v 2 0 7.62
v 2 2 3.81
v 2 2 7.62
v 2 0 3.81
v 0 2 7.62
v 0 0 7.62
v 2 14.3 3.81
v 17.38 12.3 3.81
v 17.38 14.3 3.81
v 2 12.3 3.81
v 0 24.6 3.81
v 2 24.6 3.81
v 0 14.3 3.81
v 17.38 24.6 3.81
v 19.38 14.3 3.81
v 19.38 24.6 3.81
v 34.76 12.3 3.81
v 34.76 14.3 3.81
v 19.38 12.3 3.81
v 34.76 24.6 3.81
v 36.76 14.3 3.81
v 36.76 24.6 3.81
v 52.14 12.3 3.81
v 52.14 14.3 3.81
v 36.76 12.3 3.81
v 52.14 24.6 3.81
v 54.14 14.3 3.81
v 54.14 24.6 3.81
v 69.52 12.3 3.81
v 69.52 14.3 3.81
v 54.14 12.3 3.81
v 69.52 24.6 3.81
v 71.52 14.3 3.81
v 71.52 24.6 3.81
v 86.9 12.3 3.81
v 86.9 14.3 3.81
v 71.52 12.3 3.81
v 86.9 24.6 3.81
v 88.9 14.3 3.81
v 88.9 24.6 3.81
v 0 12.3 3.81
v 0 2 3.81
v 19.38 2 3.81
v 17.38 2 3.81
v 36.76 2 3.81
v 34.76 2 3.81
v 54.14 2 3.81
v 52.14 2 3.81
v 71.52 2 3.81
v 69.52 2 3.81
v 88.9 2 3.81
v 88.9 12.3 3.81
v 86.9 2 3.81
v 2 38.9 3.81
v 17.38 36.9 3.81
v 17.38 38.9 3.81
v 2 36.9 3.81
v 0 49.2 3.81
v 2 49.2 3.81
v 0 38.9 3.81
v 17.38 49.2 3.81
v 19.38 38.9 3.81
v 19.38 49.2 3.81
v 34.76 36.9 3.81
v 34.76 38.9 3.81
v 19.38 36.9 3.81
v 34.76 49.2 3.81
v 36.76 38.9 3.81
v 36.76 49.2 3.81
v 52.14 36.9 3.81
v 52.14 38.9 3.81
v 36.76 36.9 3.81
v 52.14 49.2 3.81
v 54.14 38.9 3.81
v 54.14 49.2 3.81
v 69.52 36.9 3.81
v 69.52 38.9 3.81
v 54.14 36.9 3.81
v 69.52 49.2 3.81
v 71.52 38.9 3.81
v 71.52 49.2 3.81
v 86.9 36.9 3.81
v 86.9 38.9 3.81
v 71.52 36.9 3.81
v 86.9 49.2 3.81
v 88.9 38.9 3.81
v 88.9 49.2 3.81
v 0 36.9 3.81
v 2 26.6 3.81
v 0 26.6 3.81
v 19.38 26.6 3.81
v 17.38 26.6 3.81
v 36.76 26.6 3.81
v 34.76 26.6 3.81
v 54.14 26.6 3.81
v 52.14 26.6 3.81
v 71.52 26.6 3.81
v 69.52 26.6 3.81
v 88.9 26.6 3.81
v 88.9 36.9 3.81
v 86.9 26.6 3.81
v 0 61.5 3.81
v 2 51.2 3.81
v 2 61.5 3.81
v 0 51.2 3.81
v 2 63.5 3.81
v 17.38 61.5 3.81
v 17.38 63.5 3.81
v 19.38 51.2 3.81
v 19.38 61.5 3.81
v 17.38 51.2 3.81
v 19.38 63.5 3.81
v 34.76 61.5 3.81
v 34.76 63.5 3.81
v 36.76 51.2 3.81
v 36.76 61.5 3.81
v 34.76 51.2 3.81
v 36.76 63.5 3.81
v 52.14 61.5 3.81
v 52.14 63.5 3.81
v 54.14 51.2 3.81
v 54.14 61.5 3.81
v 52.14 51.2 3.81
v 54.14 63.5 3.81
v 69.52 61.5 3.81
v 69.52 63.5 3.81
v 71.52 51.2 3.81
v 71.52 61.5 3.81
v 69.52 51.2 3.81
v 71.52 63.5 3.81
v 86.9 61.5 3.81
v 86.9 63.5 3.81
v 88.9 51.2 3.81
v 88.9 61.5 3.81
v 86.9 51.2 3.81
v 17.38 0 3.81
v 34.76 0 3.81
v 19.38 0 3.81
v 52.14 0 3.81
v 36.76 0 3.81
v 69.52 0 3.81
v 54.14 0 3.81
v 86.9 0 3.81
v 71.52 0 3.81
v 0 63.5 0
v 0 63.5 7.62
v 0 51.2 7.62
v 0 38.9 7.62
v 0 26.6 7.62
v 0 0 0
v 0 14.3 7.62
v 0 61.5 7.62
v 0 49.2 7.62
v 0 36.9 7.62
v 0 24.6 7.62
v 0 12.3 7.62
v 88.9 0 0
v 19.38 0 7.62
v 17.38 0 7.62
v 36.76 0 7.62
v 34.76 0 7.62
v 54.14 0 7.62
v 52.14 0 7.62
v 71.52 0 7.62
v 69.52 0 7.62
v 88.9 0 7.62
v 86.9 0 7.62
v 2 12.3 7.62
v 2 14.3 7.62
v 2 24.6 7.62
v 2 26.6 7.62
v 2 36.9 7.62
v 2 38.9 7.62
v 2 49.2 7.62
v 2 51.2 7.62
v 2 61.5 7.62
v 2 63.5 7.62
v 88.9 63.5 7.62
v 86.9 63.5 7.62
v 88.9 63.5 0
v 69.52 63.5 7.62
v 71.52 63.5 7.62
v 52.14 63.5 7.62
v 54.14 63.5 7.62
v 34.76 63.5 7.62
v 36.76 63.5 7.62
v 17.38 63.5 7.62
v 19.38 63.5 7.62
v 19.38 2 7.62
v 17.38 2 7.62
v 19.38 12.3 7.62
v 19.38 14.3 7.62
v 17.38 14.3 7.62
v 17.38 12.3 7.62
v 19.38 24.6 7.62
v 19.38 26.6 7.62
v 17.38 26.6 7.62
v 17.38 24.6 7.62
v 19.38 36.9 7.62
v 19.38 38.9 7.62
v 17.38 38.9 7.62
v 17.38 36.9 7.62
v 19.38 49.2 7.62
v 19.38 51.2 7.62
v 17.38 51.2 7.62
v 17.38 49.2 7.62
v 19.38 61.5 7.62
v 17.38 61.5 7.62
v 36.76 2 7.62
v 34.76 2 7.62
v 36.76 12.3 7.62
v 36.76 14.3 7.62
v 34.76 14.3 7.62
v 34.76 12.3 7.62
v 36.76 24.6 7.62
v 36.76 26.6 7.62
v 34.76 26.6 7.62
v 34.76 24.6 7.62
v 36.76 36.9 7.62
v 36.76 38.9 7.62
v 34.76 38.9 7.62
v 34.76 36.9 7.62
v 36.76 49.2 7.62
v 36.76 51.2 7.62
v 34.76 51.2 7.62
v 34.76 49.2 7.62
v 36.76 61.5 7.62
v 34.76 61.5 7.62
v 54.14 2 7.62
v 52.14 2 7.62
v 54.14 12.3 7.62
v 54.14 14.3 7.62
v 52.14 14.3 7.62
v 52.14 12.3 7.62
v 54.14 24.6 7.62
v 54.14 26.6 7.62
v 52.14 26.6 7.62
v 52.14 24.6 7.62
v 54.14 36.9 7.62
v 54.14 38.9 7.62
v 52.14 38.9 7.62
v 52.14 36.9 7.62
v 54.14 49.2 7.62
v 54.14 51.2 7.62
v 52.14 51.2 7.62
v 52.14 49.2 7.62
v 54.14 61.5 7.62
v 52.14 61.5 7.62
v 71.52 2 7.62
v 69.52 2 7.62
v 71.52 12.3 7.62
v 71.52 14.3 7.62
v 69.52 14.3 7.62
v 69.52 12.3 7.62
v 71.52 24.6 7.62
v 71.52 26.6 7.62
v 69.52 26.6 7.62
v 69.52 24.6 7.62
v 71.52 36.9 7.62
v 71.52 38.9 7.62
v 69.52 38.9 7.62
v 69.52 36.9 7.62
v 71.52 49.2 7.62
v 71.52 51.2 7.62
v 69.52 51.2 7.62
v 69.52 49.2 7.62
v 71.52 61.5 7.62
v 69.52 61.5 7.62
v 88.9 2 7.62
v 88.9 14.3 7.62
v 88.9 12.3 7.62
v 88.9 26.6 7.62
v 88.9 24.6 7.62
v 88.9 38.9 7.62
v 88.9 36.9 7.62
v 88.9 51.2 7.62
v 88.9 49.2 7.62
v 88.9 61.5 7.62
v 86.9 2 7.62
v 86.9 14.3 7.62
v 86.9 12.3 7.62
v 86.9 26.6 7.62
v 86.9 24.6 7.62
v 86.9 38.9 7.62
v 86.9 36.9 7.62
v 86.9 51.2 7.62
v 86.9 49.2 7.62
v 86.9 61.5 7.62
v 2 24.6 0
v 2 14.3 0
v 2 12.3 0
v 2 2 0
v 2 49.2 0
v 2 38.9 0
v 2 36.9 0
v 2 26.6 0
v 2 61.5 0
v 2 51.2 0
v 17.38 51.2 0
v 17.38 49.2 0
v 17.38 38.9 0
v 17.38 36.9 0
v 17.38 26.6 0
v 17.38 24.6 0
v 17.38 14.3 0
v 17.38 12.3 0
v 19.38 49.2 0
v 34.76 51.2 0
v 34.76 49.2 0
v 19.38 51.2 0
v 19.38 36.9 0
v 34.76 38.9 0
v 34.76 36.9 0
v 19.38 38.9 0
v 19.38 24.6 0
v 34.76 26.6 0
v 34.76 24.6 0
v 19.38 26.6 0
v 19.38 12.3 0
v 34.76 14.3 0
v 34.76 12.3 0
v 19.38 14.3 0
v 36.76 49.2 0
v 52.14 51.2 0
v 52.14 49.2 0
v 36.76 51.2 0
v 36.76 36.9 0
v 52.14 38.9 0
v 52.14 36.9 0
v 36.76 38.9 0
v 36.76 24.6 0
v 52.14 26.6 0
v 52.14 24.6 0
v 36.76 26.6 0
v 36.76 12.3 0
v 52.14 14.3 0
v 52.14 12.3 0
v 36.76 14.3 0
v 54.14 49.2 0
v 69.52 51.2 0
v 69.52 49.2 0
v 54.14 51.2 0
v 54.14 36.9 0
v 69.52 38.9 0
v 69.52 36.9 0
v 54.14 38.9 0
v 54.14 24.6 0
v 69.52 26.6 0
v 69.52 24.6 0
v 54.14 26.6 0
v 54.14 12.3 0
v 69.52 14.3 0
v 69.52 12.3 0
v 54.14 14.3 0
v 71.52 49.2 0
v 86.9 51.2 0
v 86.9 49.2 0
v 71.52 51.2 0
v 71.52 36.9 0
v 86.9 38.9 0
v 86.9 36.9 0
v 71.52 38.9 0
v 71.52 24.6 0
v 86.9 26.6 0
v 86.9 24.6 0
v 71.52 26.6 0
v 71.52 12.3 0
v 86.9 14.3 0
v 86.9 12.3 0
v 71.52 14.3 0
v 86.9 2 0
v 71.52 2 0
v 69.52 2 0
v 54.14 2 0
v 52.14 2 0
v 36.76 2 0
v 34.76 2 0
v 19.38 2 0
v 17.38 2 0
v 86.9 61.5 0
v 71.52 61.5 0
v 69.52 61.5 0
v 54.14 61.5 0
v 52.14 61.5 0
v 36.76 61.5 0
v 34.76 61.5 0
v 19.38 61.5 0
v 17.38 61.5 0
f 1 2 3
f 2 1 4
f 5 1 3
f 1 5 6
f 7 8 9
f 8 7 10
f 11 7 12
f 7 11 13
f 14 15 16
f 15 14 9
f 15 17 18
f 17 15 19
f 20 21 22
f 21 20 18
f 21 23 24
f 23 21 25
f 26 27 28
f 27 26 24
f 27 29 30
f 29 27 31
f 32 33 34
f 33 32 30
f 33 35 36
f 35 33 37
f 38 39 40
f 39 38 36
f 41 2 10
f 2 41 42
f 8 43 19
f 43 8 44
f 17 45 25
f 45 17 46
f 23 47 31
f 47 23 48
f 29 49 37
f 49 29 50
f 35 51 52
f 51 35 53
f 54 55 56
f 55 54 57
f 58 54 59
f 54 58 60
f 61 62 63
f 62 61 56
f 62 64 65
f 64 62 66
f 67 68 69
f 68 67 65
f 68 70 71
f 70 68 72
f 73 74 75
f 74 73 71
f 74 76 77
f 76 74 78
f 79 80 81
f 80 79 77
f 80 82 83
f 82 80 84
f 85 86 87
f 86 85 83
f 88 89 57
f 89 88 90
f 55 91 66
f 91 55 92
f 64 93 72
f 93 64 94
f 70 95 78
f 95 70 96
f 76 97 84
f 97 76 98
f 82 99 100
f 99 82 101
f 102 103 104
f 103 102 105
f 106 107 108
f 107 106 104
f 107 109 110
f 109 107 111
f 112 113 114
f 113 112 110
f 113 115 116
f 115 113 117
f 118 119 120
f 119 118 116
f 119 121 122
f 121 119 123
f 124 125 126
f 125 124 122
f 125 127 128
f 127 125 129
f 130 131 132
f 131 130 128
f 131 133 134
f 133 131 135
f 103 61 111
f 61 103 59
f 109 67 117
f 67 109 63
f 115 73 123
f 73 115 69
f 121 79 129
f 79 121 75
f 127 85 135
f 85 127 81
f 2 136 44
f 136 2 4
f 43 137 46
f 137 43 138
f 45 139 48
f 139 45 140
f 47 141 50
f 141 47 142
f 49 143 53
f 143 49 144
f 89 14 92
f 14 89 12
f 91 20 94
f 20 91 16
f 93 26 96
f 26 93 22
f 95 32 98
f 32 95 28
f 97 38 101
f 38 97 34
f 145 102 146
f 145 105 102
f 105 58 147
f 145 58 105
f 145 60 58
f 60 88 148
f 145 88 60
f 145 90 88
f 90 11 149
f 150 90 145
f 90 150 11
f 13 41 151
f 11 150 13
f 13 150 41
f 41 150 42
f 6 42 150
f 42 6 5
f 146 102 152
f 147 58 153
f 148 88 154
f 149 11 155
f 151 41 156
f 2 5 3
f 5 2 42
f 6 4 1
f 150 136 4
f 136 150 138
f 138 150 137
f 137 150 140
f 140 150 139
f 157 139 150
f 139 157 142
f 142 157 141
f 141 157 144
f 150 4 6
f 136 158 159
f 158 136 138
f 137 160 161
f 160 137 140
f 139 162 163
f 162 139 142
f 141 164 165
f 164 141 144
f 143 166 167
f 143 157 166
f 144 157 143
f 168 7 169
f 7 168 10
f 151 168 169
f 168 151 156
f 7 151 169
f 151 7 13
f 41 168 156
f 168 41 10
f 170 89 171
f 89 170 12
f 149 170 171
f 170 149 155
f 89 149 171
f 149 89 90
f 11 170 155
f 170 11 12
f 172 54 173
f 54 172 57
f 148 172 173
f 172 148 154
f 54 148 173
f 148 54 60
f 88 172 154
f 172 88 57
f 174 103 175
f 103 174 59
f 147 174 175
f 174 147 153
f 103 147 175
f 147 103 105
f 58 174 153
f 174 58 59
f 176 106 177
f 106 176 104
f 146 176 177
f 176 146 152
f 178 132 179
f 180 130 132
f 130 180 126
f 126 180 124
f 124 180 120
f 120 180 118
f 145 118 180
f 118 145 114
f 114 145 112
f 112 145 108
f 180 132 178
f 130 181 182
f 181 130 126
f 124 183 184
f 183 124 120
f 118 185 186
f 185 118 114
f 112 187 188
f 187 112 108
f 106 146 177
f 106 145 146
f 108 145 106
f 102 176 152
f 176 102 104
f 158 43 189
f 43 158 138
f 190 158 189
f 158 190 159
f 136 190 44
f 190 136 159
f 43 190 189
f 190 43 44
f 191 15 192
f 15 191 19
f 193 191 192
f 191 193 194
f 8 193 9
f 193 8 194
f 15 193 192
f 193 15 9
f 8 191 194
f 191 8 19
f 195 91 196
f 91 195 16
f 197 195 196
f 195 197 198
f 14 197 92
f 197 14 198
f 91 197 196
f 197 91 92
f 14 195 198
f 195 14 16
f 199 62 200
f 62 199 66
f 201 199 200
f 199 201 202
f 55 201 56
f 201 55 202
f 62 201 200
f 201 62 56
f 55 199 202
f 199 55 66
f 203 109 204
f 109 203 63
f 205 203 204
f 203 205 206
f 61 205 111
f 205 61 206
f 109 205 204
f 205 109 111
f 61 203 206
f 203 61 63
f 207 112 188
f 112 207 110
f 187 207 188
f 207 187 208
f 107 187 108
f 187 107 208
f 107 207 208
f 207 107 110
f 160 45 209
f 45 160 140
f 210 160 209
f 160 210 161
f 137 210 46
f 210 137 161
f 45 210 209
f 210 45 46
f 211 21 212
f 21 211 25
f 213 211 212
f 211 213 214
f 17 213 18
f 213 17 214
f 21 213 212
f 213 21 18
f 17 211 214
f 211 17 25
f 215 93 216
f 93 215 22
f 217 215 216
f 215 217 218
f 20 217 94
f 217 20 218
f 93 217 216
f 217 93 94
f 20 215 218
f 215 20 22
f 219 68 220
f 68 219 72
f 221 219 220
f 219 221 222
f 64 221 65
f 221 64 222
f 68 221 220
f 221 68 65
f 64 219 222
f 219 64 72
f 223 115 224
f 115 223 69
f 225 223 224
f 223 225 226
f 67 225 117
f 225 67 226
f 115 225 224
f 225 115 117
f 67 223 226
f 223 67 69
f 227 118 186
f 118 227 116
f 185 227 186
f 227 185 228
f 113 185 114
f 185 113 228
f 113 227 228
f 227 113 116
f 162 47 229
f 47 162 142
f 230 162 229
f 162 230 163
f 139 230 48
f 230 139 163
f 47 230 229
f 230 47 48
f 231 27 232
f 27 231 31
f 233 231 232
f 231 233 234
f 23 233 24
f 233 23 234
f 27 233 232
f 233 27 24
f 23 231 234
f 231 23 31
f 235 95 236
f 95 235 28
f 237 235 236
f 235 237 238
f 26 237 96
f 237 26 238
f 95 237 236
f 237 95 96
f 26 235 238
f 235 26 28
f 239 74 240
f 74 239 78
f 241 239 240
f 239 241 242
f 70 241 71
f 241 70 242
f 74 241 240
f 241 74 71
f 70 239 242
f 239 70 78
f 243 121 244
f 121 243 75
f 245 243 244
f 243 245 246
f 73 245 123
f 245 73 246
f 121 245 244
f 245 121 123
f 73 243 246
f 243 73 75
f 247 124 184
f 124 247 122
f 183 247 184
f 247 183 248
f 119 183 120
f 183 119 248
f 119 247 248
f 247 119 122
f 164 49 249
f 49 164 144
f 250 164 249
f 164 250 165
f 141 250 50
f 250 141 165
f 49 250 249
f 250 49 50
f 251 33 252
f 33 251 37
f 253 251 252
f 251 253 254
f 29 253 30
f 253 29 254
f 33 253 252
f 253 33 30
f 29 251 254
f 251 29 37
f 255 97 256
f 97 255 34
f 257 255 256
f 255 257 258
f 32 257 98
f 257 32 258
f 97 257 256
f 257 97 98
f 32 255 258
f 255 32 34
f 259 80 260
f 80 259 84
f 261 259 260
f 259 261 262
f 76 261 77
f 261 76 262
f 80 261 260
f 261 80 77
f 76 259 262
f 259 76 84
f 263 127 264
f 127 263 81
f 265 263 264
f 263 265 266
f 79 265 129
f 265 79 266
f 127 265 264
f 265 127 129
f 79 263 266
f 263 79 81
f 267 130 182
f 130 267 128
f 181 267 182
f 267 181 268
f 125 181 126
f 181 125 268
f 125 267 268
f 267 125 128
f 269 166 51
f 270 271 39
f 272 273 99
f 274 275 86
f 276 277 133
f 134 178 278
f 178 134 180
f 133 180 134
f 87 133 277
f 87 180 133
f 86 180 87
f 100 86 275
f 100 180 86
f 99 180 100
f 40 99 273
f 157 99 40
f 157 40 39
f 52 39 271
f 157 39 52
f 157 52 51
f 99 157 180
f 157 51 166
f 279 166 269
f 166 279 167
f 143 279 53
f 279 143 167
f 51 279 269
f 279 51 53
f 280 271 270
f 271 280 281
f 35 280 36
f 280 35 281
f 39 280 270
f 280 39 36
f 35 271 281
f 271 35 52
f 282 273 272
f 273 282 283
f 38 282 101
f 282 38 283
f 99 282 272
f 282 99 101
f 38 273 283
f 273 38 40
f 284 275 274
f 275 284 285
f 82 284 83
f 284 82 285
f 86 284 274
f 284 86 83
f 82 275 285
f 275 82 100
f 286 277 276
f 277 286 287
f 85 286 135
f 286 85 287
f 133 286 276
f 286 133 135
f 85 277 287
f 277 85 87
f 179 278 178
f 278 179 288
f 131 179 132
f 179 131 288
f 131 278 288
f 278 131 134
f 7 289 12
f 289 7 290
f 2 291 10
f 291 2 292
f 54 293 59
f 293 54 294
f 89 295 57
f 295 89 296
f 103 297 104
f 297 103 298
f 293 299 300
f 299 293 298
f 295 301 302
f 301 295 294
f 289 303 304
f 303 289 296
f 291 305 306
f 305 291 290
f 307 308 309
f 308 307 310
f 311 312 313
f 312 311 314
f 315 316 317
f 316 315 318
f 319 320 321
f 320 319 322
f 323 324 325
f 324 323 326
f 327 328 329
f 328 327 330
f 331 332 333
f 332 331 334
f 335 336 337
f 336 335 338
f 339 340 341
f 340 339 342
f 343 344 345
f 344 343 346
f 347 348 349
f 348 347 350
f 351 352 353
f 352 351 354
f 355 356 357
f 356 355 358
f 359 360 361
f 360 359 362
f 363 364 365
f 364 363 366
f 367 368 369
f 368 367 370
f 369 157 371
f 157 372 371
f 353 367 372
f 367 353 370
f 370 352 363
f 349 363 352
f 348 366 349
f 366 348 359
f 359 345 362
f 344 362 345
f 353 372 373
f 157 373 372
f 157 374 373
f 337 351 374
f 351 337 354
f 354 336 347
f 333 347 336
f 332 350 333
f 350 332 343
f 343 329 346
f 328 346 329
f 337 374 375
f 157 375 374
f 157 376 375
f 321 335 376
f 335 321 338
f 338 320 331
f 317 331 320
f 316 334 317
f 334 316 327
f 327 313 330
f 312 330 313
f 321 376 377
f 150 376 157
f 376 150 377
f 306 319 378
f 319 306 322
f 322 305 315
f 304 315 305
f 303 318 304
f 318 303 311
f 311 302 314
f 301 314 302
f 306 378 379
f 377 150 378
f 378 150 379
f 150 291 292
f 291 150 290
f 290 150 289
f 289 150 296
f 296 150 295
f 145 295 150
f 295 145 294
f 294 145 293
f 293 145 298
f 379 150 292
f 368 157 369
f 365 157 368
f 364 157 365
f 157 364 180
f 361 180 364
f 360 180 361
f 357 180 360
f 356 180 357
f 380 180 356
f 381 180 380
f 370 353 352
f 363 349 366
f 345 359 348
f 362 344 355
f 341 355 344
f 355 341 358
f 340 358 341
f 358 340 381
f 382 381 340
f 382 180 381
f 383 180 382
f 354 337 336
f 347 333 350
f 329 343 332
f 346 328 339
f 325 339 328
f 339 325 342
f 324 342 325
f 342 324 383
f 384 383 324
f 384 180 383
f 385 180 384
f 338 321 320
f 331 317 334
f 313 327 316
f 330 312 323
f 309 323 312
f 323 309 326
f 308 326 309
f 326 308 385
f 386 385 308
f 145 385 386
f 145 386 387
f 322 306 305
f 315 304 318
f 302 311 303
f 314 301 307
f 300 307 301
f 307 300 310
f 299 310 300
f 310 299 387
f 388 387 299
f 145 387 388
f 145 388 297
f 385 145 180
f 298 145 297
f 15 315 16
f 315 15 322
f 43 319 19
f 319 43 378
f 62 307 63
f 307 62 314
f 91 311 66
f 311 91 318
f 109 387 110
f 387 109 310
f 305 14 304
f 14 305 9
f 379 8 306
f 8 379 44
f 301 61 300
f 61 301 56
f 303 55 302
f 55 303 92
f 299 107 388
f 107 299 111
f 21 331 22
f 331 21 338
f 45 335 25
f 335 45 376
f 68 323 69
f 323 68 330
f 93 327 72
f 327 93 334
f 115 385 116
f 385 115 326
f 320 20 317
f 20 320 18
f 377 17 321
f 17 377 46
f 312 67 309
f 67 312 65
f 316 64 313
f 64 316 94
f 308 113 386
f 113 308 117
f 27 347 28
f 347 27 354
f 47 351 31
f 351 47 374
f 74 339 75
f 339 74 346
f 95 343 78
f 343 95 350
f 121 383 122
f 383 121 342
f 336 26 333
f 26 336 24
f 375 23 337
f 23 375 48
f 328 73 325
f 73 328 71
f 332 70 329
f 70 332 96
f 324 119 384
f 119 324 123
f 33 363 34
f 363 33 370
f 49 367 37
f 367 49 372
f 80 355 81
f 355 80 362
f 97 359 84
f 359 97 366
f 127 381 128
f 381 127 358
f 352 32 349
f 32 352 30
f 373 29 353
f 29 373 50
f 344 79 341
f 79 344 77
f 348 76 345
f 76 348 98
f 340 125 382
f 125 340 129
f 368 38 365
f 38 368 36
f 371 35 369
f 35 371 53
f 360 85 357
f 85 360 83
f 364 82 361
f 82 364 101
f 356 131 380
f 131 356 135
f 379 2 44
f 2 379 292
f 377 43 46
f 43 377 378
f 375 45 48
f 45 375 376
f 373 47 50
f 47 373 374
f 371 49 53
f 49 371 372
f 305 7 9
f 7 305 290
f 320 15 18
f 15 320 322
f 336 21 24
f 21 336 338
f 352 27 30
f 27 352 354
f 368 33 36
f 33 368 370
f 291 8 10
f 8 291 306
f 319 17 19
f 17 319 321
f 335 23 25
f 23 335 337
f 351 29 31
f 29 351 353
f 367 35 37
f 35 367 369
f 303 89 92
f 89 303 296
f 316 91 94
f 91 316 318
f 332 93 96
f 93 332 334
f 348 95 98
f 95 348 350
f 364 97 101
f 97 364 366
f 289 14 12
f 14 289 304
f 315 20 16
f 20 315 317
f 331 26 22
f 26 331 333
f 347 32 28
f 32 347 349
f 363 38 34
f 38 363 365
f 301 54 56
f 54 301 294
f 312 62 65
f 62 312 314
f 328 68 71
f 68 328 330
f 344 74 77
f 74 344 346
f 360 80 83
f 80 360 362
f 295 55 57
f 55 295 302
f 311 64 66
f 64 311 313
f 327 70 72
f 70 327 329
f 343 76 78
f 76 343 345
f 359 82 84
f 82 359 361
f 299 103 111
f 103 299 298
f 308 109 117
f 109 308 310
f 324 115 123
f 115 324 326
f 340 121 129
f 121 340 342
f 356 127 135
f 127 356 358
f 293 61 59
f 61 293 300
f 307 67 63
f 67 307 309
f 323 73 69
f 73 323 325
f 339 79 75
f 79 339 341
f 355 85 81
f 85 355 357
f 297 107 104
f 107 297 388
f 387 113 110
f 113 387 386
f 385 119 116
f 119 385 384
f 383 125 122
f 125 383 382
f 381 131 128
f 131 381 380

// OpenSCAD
in=25.4;
width=3.5*in;
depth=2.5*in;
height=0.15*in; //maximum height
base=2;   //height of base
cycles=5;   //how many full cos cycles in the space
slice=2; //desired resolution of each slice

union() {
         for (x=[0 : cycles]) {
            for (y=[0 : cycles]) {
                translate([x*((width-slice)/cycles), y*((depth-slice)/cycles), height]) cube([slice, slice, height]);
            }
        }
   *intersection() {
        for (i=[0 : cycles]) {
            translate([i*((width-slice)/cycles), 0, 0]) cube([slice, depth, height]);
            echo(i=i);
        }
        for (i=[0 : cycles]) {
            translate([0, i*((depth-slice)/cycles), 0]) cube([width, slice, height]);
            echo(i=i);
        }
    }
    for (i=[0 : cycles]) {
        translate([i*((width-slice)/cycles), 0, 0]) cube([slice, depth, height]);
        echo(i=i);
    }
    for (i=[0 : cycles]) {
        translate([0, i*((depth-slice)/cycles), 0]) cube([width, slice, height]);
        echo(i=i);
    }
}
